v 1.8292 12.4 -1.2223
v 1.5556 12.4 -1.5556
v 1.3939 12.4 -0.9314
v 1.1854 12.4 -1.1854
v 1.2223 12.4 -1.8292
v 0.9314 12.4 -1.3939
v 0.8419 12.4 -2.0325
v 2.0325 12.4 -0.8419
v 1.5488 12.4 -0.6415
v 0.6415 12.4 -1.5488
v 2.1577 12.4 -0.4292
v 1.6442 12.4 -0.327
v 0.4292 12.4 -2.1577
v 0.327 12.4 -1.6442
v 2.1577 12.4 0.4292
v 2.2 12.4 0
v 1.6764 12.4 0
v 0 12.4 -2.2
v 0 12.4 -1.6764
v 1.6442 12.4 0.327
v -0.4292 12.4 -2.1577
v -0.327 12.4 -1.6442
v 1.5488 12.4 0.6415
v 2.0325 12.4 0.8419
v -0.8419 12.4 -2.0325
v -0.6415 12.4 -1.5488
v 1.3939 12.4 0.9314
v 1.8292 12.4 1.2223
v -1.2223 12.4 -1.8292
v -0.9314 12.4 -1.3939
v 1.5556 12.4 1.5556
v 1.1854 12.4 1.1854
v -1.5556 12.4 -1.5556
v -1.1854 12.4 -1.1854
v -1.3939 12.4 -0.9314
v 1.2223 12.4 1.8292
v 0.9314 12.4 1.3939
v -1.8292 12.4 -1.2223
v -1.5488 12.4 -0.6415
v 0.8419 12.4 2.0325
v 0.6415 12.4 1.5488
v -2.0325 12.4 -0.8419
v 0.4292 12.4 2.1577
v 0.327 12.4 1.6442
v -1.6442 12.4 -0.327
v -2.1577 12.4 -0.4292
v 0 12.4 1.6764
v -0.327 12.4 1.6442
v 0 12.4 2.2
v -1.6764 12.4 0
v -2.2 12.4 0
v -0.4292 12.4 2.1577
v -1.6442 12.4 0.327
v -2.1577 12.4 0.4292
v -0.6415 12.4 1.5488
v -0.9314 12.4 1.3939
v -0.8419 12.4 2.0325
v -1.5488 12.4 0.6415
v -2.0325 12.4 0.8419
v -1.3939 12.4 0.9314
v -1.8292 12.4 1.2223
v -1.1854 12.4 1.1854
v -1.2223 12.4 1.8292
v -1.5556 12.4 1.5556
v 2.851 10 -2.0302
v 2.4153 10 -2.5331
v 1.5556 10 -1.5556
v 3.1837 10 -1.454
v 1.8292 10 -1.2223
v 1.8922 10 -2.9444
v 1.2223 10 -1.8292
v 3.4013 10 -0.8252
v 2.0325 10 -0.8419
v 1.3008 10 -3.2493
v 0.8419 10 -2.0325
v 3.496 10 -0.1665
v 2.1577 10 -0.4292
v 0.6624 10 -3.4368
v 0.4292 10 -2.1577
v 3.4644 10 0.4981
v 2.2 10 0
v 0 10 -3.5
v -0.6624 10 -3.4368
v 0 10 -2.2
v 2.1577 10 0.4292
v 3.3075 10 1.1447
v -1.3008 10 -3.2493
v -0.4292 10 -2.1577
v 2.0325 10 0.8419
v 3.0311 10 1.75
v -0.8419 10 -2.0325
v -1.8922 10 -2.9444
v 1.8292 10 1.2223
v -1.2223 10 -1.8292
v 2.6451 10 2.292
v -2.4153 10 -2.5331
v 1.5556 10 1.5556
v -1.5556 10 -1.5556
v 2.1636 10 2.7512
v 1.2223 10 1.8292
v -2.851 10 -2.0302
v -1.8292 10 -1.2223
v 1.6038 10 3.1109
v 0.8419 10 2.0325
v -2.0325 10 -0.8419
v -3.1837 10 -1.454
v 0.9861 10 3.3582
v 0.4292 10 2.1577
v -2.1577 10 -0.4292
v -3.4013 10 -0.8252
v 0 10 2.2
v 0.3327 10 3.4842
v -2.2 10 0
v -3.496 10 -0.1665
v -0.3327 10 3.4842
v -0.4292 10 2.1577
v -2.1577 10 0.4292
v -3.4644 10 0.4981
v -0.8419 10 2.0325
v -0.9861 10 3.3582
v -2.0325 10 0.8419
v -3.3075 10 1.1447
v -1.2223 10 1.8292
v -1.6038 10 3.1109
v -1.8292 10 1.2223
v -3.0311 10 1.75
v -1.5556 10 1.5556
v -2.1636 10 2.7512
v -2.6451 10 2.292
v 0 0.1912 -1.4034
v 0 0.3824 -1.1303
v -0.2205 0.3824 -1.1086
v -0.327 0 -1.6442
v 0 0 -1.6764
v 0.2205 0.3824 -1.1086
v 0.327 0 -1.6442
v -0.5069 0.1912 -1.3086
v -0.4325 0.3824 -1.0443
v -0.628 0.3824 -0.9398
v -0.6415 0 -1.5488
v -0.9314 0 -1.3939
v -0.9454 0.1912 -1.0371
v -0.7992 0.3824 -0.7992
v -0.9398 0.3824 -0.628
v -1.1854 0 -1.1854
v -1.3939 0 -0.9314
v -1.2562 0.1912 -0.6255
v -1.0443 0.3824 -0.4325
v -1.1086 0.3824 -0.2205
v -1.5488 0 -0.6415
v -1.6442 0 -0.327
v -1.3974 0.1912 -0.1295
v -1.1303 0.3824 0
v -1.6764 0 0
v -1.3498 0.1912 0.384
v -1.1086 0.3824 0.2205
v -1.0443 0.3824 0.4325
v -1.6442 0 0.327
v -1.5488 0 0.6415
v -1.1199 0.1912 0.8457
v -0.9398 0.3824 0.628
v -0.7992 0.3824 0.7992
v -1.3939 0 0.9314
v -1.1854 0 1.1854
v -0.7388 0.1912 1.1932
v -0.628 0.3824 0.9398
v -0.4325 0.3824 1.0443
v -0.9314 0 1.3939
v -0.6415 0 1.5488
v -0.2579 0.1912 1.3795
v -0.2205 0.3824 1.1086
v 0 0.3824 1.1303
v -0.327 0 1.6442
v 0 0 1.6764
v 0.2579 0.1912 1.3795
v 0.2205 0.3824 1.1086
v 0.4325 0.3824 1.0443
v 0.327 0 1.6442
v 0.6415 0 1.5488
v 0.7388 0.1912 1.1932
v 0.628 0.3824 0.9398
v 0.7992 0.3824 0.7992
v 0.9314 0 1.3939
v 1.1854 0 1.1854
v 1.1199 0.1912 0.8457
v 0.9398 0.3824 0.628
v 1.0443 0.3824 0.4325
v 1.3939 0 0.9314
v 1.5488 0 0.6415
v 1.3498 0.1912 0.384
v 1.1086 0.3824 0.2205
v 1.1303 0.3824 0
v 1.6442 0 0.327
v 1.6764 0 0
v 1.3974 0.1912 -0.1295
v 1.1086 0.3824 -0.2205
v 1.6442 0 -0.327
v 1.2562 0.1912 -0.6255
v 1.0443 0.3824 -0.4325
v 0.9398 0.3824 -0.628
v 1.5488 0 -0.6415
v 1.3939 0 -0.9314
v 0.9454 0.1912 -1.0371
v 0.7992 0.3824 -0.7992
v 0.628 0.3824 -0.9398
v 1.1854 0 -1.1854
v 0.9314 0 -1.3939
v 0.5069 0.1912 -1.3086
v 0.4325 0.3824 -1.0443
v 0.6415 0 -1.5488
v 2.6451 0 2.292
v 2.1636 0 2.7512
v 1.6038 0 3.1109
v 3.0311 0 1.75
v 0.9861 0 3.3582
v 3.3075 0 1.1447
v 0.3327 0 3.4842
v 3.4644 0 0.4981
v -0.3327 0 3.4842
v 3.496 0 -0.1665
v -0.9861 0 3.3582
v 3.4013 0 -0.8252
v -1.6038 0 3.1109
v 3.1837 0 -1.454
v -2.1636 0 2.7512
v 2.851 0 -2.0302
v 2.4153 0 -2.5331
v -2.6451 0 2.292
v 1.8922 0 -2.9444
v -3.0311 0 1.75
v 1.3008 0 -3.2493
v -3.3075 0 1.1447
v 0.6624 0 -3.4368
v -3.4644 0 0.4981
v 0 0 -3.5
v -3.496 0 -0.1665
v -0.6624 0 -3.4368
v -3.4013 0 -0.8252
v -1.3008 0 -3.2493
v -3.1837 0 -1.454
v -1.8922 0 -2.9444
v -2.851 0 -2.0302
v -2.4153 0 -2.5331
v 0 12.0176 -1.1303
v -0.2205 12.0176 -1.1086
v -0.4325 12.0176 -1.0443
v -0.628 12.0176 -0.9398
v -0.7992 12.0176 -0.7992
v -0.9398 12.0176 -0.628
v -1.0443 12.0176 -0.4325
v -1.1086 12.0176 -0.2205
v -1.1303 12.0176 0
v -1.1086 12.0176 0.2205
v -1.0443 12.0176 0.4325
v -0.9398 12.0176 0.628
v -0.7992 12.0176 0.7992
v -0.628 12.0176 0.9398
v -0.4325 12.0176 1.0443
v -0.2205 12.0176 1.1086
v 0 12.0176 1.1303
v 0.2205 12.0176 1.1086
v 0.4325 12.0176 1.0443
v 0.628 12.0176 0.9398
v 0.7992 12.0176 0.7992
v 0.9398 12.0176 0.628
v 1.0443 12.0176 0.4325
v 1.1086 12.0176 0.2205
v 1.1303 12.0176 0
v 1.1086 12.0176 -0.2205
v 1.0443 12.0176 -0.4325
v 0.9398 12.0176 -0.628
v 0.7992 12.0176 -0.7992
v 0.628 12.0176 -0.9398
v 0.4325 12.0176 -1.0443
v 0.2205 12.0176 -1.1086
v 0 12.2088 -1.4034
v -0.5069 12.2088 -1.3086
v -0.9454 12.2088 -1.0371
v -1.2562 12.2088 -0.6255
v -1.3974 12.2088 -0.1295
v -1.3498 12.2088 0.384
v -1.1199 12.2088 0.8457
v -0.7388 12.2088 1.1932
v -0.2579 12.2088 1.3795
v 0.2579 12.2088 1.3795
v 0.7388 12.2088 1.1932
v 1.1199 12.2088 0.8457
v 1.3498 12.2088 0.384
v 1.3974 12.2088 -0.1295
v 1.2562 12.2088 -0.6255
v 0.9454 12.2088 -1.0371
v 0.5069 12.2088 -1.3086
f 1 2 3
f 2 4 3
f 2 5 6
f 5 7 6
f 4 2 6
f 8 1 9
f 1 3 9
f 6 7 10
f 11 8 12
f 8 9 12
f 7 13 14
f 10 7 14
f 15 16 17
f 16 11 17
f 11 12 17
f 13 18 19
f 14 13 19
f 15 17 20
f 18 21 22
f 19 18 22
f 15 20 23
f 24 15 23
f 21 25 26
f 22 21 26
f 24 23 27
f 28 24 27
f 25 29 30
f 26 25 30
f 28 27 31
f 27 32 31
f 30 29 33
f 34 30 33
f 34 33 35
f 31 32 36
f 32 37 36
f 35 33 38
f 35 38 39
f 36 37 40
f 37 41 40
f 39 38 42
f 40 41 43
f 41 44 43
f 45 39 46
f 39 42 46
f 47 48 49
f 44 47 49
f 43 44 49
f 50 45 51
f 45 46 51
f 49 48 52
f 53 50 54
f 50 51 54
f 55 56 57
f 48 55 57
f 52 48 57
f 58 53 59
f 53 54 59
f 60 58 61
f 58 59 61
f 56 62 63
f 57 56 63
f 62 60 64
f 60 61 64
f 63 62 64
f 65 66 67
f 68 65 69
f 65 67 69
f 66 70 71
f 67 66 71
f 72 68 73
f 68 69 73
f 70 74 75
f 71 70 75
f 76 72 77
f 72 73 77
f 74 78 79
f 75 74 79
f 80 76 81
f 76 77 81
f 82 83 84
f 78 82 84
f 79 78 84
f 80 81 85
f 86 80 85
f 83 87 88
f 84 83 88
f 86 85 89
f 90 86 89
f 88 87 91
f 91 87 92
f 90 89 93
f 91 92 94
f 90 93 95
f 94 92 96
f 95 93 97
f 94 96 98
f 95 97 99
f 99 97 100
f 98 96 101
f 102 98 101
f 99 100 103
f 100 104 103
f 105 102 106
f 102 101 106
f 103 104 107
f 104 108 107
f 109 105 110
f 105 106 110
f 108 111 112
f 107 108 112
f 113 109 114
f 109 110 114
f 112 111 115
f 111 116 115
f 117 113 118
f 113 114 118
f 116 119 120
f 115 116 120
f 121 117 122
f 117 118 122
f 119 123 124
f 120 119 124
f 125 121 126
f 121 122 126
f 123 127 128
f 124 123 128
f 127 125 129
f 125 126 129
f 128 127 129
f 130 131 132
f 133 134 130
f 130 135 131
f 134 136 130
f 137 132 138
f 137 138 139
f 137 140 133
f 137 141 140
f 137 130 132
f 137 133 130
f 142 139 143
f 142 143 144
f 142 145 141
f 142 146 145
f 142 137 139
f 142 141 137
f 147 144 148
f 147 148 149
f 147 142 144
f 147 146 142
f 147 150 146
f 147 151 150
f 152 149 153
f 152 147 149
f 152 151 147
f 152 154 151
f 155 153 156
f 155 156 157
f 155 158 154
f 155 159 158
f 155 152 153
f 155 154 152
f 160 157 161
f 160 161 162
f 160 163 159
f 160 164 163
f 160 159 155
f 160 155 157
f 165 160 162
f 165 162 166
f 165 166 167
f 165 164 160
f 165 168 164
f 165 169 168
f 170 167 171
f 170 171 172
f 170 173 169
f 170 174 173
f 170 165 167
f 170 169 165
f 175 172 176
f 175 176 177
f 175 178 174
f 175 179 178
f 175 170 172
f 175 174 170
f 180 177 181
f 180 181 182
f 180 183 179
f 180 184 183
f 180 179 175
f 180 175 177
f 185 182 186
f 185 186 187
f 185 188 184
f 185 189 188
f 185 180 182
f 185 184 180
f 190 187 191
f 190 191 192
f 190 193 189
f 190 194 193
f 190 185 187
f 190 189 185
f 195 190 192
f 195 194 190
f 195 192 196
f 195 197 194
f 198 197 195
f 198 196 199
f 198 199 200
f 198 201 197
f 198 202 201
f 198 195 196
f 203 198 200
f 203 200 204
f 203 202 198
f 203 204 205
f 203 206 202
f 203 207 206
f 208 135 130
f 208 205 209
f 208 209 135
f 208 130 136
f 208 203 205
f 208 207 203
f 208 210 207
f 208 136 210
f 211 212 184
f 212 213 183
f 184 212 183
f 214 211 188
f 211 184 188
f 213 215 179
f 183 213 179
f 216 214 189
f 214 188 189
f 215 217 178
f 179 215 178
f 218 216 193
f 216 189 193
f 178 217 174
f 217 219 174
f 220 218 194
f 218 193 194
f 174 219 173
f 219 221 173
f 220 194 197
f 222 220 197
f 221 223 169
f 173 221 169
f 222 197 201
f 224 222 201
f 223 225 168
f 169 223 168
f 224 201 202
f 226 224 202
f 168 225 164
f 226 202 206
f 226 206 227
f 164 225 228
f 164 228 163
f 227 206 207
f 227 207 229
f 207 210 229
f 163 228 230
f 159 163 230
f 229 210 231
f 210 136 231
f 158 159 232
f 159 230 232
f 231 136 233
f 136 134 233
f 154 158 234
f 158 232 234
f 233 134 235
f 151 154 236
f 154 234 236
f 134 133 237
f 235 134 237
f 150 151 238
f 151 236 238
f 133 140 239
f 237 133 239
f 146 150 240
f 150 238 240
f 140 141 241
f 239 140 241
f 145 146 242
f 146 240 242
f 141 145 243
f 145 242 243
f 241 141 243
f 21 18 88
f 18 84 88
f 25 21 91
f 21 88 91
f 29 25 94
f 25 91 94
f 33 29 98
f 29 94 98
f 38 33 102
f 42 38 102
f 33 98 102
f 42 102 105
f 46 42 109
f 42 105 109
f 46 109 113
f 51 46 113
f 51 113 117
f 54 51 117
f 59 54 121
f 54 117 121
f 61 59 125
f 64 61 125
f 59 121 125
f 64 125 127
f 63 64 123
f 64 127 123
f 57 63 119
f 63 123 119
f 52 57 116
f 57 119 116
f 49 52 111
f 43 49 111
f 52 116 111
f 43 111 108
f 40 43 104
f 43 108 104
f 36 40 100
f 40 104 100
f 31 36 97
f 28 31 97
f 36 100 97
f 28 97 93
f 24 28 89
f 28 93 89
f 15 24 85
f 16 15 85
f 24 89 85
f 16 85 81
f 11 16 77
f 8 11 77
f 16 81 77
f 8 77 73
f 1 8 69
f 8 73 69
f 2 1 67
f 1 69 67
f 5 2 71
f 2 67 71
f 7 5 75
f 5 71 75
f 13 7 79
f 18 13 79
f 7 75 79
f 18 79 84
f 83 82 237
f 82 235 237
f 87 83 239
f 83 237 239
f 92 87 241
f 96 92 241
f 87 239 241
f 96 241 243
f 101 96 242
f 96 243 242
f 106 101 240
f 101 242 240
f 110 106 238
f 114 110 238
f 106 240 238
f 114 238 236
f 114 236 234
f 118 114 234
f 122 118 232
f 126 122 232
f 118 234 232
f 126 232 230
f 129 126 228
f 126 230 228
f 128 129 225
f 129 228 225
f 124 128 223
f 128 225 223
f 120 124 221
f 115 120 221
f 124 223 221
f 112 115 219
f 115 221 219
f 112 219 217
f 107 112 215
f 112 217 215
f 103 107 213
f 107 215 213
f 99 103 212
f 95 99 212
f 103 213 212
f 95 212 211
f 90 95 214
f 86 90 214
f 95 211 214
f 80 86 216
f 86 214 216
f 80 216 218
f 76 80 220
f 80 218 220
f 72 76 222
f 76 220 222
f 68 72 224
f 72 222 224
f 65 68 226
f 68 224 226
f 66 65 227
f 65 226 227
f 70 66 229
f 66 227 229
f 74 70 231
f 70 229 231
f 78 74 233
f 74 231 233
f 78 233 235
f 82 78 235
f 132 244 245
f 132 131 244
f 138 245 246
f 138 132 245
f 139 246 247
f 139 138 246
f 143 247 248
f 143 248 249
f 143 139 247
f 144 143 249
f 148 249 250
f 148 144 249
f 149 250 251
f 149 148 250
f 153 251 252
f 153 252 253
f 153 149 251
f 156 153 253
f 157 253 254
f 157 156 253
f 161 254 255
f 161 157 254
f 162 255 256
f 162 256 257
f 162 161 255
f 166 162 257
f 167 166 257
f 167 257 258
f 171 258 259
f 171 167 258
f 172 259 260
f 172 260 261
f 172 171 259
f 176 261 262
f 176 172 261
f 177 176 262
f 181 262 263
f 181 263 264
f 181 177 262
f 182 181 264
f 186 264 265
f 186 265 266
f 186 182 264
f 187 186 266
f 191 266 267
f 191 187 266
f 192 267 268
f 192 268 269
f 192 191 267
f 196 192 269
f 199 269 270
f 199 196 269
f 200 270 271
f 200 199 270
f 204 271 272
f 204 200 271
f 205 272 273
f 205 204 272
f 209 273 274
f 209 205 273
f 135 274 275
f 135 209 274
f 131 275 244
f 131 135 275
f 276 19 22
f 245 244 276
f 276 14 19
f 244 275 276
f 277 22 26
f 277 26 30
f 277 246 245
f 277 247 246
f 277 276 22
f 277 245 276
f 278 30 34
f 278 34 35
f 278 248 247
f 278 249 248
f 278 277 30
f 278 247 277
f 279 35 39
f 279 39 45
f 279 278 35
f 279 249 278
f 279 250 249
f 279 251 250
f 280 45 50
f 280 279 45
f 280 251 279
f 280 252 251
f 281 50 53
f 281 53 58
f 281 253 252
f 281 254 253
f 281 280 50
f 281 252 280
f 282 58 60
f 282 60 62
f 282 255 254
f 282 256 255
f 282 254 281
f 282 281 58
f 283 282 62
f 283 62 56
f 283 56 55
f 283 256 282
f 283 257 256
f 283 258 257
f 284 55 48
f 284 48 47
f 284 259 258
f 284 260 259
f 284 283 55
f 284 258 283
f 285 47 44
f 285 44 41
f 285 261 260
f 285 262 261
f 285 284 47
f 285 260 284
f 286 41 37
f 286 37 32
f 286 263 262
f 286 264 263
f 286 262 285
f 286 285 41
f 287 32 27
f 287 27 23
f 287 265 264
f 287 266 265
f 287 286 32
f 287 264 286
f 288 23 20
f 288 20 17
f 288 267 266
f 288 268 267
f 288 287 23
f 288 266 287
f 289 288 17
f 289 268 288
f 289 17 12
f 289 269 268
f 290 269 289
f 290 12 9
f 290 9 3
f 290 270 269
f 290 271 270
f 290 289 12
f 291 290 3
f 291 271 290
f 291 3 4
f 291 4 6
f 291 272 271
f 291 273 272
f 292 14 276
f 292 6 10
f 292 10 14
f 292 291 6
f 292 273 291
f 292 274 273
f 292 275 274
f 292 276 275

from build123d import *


with BuildPart() as part:
    # Эскиз1 → Повернуть1 (revolve)
    with BuildSketch(Plane(origin=(0, 0, 0), x_dir=(0, 0, -1), z_dir=(1, 0, 0))):
        Polygon((0, 0), (0, 12.4), (2.2, 12.4), (2.2, 10), (3.5, 10), (3.5, 0), align=None)
    revolve(axis=Axis((0, 0, 0), (0, 1, 0)))

    # Эскиз2 → Отверстие обработанное метчиком #4-401 (revolve, cut)
    with BuildSketch(Plane(origin=(0, 0, 0), x_dir=(0, 0, -1), z_dir=(1, 0, 0))):
        Polygon((0, 0), (0, 12.4), (1.6764, 12.4), (1.1303, 12.017616663), (1.1303, 0.382383337), (1.6764, 0), align=None)
    revolve(axis=Axis((0, -6.35, 0), (0, 1, 0)), mode=Mode.SUBTRACT)


solid = part.part
